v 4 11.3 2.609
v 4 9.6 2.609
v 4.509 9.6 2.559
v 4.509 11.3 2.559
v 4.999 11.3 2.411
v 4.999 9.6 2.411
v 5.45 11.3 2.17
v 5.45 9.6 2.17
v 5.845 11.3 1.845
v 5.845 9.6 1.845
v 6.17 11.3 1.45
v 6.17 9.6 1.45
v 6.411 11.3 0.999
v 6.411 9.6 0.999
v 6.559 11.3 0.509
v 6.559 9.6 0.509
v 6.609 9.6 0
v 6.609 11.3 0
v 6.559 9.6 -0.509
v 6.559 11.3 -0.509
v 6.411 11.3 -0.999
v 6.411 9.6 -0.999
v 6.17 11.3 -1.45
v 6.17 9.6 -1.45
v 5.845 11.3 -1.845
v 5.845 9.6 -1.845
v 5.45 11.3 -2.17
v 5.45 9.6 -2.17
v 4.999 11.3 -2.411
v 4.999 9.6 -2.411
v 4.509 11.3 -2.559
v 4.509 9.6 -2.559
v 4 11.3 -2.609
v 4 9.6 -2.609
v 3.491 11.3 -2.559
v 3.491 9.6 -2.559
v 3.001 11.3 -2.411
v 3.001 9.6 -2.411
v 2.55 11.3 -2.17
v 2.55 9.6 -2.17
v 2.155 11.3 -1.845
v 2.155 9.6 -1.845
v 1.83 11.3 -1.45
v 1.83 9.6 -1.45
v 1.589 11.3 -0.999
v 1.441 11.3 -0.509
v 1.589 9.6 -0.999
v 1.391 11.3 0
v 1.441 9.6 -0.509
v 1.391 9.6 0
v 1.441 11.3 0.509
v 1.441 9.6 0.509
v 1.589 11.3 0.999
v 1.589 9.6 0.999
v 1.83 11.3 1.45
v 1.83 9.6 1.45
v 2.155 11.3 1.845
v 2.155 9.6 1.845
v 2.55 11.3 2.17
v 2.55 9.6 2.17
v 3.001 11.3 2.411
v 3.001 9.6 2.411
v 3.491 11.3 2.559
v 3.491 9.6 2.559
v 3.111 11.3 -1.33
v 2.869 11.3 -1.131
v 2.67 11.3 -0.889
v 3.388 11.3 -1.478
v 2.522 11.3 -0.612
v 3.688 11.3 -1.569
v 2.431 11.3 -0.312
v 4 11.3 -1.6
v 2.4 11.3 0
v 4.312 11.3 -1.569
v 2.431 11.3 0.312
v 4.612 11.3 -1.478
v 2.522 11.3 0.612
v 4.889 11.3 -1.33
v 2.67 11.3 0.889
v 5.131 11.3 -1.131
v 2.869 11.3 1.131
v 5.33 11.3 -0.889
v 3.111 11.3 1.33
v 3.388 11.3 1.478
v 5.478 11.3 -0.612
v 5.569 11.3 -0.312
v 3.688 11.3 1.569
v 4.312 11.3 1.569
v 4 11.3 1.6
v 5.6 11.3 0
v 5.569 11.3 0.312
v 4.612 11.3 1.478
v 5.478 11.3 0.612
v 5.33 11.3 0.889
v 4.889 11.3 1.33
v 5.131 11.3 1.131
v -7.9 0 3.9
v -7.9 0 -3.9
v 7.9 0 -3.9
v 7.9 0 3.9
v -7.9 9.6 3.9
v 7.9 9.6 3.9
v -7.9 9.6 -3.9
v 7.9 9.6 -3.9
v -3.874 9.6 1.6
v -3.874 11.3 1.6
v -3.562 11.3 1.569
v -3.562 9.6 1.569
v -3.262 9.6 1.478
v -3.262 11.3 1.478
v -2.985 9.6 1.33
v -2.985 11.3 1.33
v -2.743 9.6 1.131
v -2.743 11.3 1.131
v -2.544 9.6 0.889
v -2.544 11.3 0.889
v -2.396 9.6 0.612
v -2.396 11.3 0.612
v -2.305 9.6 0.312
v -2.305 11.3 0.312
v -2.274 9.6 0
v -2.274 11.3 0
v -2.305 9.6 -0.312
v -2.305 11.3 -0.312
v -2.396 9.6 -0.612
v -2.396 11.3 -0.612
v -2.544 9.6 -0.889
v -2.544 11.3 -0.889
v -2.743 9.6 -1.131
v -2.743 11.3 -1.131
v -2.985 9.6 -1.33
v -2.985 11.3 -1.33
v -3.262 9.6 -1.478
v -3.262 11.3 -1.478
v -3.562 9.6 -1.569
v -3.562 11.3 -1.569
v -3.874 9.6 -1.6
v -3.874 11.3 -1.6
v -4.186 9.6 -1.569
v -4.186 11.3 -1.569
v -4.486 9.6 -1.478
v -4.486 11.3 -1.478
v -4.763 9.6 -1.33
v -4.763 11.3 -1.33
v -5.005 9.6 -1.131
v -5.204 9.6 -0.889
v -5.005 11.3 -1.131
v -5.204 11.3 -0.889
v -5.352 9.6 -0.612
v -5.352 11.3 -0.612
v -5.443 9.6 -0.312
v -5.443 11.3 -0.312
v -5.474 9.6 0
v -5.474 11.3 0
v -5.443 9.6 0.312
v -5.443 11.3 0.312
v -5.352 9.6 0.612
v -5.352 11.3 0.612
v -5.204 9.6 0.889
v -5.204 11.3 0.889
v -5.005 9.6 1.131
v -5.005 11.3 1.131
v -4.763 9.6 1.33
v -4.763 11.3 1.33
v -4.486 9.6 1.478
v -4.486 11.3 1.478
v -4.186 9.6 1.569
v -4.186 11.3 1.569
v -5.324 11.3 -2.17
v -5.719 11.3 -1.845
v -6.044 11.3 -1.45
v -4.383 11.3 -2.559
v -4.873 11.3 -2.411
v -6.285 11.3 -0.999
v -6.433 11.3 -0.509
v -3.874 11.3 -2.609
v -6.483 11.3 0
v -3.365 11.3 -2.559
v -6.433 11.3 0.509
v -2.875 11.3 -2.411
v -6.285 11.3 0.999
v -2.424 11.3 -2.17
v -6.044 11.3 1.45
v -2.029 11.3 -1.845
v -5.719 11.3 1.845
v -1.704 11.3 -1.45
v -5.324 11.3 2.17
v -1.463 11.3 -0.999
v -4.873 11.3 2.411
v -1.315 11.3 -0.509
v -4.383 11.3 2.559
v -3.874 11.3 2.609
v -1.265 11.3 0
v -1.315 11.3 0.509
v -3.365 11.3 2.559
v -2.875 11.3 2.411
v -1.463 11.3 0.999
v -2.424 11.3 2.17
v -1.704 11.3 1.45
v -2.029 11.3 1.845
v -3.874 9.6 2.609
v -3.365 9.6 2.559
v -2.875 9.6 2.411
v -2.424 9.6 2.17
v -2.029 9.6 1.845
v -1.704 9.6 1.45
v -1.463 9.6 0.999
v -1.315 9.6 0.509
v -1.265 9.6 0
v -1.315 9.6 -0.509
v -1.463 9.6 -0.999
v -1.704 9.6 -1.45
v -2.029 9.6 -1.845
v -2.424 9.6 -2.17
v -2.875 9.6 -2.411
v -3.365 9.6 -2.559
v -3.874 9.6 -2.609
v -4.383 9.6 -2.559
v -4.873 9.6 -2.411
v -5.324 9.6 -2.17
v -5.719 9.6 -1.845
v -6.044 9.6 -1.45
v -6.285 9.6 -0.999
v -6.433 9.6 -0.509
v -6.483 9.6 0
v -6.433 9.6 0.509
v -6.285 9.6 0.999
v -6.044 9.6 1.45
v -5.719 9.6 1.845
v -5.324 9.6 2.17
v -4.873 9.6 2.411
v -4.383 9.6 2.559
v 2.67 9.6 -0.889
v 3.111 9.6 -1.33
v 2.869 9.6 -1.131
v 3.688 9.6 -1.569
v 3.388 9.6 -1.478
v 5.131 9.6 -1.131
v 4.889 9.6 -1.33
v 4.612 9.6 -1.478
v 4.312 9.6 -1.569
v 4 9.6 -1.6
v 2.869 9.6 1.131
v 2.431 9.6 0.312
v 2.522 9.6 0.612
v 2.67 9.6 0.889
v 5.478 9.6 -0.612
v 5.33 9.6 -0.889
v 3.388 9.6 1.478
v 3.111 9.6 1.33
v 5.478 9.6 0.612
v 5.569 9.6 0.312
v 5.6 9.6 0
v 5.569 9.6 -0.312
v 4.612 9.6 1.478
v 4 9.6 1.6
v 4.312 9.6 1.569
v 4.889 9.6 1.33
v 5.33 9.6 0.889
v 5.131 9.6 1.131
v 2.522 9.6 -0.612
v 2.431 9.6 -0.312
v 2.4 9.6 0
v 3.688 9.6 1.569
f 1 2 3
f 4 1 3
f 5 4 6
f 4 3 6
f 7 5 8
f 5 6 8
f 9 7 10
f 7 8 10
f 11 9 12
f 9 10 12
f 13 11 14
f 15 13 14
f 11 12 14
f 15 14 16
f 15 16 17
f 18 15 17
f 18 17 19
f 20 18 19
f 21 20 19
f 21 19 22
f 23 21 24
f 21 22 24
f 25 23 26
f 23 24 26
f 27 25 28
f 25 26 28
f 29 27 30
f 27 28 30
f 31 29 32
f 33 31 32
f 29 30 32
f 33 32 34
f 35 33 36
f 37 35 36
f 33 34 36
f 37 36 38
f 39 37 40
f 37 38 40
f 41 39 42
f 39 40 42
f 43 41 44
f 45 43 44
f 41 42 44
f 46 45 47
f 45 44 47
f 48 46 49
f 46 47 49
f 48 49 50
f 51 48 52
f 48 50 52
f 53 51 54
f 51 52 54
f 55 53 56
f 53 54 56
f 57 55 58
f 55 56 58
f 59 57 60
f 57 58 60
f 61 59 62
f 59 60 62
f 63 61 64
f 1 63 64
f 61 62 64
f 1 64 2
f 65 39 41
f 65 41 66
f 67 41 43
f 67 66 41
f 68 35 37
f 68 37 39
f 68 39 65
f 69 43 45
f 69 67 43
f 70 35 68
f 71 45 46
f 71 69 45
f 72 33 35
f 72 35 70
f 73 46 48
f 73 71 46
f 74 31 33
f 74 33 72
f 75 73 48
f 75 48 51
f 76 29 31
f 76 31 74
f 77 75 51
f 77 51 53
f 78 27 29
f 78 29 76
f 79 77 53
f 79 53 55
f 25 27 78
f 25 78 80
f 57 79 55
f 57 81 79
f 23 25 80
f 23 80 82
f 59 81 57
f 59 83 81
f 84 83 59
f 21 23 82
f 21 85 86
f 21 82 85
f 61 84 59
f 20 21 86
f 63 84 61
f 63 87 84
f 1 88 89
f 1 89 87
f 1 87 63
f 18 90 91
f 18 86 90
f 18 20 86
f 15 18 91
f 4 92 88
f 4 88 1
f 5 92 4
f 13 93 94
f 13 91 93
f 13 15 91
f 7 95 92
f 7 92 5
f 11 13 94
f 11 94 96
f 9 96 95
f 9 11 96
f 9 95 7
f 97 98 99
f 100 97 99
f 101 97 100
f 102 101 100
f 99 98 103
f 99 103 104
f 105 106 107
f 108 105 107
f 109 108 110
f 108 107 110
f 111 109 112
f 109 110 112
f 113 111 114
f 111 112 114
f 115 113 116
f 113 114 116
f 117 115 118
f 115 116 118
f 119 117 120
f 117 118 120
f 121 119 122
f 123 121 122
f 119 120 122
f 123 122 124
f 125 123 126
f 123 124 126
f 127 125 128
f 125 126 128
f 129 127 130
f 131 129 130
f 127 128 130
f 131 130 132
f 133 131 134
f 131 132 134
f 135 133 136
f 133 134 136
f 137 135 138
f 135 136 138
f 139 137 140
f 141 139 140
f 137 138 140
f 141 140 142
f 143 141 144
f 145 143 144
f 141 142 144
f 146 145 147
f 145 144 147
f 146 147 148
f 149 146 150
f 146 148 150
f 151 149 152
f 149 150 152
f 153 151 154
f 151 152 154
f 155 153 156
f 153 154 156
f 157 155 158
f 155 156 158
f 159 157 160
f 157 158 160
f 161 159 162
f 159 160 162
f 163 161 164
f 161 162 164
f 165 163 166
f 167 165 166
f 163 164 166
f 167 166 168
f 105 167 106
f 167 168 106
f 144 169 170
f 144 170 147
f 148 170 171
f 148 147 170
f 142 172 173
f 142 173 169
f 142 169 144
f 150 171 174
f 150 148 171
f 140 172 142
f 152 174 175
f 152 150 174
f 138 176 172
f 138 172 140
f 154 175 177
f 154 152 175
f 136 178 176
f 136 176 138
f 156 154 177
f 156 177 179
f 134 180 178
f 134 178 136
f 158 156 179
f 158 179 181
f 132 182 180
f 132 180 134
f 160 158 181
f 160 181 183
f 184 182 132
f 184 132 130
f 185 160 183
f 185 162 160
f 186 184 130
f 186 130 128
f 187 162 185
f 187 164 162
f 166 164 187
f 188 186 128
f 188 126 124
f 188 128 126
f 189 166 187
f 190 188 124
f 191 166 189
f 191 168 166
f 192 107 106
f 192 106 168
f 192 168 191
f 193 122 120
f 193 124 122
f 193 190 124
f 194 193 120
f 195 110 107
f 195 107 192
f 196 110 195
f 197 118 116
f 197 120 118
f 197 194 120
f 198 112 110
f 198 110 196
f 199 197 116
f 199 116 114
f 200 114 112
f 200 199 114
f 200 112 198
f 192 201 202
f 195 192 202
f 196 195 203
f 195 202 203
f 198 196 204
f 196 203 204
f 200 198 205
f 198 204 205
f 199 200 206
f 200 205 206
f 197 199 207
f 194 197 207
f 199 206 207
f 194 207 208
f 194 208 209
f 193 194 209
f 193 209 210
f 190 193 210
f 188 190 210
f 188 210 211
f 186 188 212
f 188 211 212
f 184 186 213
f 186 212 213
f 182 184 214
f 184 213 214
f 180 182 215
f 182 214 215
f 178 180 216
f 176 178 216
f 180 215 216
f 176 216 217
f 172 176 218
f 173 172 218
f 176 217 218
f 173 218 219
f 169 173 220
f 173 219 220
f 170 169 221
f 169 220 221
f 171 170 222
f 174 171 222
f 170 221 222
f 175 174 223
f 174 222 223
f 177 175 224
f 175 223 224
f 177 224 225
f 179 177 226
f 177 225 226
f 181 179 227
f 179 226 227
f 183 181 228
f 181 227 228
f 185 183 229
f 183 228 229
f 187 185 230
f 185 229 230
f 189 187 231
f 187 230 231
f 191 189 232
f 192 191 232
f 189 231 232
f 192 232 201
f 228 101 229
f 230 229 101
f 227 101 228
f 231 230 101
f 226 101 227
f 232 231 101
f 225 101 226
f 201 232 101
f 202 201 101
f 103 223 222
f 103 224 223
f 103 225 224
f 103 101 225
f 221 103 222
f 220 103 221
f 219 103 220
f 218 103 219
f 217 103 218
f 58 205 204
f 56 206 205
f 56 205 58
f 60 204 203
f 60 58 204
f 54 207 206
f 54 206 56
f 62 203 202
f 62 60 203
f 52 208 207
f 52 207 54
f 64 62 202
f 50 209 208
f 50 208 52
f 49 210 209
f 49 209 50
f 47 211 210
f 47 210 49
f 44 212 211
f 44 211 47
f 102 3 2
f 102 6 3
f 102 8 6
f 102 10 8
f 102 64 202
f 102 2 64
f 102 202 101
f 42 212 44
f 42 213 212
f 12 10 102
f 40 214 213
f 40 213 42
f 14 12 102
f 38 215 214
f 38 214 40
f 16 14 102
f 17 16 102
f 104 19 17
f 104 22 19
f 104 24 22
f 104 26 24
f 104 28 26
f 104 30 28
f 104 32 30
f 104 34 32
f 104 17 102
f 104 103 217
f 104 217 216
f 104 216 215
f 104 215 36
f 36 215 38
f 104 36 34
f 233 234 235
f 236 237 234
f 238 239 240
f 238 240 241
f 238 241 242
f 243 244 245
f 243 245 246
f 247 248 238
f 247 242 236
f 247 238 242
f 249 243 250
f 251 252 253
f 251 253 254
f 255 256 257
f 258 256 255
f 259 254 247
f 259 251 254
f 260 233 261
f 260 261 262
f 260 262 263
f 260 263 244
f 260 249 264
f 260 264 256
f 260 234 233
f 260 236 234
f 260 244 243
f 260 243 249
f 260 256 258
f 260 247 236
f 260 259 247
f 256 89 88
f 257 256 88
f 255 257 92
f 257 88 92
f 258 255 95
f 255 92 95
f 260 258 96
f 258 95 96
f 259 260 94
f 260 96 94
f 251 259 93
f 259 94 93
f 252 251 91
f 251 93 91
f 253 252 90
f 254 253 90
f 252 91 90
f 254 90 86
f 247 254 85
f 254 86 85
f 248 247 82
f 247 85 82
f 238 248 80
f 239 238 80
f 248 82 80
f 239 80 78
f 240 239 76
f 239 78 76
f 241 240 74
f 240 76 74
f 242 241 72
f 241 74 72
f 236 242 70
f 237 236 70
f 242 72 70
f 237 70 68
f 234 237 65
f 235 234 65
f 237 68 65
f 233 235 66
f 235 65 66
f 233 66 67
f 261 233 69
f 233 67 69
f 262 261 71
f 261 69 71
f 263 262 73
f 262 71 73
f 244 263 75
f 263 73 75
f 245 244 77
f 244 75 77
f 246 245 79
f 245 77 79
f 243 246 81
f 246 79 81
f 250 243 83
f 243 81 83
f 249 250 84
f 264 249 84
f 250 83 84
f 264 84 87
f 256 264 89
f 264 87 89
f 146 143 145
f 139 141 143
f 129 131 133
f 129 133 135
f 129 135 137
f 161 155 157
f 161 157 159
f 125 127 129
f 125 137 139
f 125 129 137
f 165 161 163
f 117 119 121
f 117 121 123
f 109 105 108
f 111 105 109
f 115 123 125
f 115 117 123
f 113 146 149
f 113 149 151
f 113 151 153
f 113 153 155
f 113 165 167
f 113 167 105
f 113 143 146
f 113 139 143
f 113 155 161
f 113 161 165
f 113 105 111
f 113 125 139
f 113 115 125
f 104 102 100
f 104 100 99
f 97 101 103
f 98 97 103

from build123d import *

# Parameters (mm, degrees)
SKETCH_2_W          = 15.8
SKETCH_2_H          = 7.8
EXTRUDE_1_DEPTH     = 9.6
SKETCH_3_R          = 2.609387956
EXTRUDE_2_DEPTH     = 1.7
SKETCH_4_R          = 1.6
CUT_EXTRUDE_1_DEPTH = 1.7
SKETCH_5_R          = 1.6
CUT_EXTRUDE_2_DEPTH = 1.7


with BuildPart() as part:
    # Эскиз2 → Бобышка-Вытянуть1 (new body)
    with BuildSketch(Plane(origin=(0, 0, 0), x_dir=(1, 0, 0), z_dir=(0, 1, 0))):
        Rectangle(SKETCH_2_W, SKETCH_2_H)
    extrude(amount=EXTRUDE_1_DEPTH)

    # Эскиз3 → Бобышка-Вытянуть2 (add)
    with BuildSketch(Plane(origin=(0, 9.6, 0), x_dir=(1, 0, 0), z_dir=(0, 1, 0))):
        with Locations(Location((4, 0, 0), (0, 0, 270))):
            Circle(SKETCH_3_R)
        with Locations(Location((-3.874, 0, 0), (0, 0, 270))):
            Circle(SKETCH_3_R)
    extrude(amount=EXTRUDE_2_DEPTH)

    # Эскиз4 → Вырез-Вытянуть1 (cut)
    with BuildSketch(Plane(origin=(0, 11.3, 0), x_dir=(1, 0, 0), z_dir=(0, 1, 0))):
        with Locations(Location((-3.874, 0, 0), (0, 0, 270))):
            Circle(SKETCH_4_R)
    extrude(amount=-CUT_EXTRUDE_1_DEPTH, mode=Mode.SUBTRACT)

    # Эскиз5 → Вырез-Вытянуть2 (cut)
    with BuildSketch(Plane(origin=(0, 11.3, 0), x_dir=(1, 0, 0), z_dir=(0, 1, 0))):
        with Locations(Location((4, 0, 0), (0, 0, 270))):
            Circle(SKETCH_5_R)
    extrude(amount=-CUT_EXTRUDE_2_DEPTH, mode=Mode.SUBTRACT)


solid = part.part
